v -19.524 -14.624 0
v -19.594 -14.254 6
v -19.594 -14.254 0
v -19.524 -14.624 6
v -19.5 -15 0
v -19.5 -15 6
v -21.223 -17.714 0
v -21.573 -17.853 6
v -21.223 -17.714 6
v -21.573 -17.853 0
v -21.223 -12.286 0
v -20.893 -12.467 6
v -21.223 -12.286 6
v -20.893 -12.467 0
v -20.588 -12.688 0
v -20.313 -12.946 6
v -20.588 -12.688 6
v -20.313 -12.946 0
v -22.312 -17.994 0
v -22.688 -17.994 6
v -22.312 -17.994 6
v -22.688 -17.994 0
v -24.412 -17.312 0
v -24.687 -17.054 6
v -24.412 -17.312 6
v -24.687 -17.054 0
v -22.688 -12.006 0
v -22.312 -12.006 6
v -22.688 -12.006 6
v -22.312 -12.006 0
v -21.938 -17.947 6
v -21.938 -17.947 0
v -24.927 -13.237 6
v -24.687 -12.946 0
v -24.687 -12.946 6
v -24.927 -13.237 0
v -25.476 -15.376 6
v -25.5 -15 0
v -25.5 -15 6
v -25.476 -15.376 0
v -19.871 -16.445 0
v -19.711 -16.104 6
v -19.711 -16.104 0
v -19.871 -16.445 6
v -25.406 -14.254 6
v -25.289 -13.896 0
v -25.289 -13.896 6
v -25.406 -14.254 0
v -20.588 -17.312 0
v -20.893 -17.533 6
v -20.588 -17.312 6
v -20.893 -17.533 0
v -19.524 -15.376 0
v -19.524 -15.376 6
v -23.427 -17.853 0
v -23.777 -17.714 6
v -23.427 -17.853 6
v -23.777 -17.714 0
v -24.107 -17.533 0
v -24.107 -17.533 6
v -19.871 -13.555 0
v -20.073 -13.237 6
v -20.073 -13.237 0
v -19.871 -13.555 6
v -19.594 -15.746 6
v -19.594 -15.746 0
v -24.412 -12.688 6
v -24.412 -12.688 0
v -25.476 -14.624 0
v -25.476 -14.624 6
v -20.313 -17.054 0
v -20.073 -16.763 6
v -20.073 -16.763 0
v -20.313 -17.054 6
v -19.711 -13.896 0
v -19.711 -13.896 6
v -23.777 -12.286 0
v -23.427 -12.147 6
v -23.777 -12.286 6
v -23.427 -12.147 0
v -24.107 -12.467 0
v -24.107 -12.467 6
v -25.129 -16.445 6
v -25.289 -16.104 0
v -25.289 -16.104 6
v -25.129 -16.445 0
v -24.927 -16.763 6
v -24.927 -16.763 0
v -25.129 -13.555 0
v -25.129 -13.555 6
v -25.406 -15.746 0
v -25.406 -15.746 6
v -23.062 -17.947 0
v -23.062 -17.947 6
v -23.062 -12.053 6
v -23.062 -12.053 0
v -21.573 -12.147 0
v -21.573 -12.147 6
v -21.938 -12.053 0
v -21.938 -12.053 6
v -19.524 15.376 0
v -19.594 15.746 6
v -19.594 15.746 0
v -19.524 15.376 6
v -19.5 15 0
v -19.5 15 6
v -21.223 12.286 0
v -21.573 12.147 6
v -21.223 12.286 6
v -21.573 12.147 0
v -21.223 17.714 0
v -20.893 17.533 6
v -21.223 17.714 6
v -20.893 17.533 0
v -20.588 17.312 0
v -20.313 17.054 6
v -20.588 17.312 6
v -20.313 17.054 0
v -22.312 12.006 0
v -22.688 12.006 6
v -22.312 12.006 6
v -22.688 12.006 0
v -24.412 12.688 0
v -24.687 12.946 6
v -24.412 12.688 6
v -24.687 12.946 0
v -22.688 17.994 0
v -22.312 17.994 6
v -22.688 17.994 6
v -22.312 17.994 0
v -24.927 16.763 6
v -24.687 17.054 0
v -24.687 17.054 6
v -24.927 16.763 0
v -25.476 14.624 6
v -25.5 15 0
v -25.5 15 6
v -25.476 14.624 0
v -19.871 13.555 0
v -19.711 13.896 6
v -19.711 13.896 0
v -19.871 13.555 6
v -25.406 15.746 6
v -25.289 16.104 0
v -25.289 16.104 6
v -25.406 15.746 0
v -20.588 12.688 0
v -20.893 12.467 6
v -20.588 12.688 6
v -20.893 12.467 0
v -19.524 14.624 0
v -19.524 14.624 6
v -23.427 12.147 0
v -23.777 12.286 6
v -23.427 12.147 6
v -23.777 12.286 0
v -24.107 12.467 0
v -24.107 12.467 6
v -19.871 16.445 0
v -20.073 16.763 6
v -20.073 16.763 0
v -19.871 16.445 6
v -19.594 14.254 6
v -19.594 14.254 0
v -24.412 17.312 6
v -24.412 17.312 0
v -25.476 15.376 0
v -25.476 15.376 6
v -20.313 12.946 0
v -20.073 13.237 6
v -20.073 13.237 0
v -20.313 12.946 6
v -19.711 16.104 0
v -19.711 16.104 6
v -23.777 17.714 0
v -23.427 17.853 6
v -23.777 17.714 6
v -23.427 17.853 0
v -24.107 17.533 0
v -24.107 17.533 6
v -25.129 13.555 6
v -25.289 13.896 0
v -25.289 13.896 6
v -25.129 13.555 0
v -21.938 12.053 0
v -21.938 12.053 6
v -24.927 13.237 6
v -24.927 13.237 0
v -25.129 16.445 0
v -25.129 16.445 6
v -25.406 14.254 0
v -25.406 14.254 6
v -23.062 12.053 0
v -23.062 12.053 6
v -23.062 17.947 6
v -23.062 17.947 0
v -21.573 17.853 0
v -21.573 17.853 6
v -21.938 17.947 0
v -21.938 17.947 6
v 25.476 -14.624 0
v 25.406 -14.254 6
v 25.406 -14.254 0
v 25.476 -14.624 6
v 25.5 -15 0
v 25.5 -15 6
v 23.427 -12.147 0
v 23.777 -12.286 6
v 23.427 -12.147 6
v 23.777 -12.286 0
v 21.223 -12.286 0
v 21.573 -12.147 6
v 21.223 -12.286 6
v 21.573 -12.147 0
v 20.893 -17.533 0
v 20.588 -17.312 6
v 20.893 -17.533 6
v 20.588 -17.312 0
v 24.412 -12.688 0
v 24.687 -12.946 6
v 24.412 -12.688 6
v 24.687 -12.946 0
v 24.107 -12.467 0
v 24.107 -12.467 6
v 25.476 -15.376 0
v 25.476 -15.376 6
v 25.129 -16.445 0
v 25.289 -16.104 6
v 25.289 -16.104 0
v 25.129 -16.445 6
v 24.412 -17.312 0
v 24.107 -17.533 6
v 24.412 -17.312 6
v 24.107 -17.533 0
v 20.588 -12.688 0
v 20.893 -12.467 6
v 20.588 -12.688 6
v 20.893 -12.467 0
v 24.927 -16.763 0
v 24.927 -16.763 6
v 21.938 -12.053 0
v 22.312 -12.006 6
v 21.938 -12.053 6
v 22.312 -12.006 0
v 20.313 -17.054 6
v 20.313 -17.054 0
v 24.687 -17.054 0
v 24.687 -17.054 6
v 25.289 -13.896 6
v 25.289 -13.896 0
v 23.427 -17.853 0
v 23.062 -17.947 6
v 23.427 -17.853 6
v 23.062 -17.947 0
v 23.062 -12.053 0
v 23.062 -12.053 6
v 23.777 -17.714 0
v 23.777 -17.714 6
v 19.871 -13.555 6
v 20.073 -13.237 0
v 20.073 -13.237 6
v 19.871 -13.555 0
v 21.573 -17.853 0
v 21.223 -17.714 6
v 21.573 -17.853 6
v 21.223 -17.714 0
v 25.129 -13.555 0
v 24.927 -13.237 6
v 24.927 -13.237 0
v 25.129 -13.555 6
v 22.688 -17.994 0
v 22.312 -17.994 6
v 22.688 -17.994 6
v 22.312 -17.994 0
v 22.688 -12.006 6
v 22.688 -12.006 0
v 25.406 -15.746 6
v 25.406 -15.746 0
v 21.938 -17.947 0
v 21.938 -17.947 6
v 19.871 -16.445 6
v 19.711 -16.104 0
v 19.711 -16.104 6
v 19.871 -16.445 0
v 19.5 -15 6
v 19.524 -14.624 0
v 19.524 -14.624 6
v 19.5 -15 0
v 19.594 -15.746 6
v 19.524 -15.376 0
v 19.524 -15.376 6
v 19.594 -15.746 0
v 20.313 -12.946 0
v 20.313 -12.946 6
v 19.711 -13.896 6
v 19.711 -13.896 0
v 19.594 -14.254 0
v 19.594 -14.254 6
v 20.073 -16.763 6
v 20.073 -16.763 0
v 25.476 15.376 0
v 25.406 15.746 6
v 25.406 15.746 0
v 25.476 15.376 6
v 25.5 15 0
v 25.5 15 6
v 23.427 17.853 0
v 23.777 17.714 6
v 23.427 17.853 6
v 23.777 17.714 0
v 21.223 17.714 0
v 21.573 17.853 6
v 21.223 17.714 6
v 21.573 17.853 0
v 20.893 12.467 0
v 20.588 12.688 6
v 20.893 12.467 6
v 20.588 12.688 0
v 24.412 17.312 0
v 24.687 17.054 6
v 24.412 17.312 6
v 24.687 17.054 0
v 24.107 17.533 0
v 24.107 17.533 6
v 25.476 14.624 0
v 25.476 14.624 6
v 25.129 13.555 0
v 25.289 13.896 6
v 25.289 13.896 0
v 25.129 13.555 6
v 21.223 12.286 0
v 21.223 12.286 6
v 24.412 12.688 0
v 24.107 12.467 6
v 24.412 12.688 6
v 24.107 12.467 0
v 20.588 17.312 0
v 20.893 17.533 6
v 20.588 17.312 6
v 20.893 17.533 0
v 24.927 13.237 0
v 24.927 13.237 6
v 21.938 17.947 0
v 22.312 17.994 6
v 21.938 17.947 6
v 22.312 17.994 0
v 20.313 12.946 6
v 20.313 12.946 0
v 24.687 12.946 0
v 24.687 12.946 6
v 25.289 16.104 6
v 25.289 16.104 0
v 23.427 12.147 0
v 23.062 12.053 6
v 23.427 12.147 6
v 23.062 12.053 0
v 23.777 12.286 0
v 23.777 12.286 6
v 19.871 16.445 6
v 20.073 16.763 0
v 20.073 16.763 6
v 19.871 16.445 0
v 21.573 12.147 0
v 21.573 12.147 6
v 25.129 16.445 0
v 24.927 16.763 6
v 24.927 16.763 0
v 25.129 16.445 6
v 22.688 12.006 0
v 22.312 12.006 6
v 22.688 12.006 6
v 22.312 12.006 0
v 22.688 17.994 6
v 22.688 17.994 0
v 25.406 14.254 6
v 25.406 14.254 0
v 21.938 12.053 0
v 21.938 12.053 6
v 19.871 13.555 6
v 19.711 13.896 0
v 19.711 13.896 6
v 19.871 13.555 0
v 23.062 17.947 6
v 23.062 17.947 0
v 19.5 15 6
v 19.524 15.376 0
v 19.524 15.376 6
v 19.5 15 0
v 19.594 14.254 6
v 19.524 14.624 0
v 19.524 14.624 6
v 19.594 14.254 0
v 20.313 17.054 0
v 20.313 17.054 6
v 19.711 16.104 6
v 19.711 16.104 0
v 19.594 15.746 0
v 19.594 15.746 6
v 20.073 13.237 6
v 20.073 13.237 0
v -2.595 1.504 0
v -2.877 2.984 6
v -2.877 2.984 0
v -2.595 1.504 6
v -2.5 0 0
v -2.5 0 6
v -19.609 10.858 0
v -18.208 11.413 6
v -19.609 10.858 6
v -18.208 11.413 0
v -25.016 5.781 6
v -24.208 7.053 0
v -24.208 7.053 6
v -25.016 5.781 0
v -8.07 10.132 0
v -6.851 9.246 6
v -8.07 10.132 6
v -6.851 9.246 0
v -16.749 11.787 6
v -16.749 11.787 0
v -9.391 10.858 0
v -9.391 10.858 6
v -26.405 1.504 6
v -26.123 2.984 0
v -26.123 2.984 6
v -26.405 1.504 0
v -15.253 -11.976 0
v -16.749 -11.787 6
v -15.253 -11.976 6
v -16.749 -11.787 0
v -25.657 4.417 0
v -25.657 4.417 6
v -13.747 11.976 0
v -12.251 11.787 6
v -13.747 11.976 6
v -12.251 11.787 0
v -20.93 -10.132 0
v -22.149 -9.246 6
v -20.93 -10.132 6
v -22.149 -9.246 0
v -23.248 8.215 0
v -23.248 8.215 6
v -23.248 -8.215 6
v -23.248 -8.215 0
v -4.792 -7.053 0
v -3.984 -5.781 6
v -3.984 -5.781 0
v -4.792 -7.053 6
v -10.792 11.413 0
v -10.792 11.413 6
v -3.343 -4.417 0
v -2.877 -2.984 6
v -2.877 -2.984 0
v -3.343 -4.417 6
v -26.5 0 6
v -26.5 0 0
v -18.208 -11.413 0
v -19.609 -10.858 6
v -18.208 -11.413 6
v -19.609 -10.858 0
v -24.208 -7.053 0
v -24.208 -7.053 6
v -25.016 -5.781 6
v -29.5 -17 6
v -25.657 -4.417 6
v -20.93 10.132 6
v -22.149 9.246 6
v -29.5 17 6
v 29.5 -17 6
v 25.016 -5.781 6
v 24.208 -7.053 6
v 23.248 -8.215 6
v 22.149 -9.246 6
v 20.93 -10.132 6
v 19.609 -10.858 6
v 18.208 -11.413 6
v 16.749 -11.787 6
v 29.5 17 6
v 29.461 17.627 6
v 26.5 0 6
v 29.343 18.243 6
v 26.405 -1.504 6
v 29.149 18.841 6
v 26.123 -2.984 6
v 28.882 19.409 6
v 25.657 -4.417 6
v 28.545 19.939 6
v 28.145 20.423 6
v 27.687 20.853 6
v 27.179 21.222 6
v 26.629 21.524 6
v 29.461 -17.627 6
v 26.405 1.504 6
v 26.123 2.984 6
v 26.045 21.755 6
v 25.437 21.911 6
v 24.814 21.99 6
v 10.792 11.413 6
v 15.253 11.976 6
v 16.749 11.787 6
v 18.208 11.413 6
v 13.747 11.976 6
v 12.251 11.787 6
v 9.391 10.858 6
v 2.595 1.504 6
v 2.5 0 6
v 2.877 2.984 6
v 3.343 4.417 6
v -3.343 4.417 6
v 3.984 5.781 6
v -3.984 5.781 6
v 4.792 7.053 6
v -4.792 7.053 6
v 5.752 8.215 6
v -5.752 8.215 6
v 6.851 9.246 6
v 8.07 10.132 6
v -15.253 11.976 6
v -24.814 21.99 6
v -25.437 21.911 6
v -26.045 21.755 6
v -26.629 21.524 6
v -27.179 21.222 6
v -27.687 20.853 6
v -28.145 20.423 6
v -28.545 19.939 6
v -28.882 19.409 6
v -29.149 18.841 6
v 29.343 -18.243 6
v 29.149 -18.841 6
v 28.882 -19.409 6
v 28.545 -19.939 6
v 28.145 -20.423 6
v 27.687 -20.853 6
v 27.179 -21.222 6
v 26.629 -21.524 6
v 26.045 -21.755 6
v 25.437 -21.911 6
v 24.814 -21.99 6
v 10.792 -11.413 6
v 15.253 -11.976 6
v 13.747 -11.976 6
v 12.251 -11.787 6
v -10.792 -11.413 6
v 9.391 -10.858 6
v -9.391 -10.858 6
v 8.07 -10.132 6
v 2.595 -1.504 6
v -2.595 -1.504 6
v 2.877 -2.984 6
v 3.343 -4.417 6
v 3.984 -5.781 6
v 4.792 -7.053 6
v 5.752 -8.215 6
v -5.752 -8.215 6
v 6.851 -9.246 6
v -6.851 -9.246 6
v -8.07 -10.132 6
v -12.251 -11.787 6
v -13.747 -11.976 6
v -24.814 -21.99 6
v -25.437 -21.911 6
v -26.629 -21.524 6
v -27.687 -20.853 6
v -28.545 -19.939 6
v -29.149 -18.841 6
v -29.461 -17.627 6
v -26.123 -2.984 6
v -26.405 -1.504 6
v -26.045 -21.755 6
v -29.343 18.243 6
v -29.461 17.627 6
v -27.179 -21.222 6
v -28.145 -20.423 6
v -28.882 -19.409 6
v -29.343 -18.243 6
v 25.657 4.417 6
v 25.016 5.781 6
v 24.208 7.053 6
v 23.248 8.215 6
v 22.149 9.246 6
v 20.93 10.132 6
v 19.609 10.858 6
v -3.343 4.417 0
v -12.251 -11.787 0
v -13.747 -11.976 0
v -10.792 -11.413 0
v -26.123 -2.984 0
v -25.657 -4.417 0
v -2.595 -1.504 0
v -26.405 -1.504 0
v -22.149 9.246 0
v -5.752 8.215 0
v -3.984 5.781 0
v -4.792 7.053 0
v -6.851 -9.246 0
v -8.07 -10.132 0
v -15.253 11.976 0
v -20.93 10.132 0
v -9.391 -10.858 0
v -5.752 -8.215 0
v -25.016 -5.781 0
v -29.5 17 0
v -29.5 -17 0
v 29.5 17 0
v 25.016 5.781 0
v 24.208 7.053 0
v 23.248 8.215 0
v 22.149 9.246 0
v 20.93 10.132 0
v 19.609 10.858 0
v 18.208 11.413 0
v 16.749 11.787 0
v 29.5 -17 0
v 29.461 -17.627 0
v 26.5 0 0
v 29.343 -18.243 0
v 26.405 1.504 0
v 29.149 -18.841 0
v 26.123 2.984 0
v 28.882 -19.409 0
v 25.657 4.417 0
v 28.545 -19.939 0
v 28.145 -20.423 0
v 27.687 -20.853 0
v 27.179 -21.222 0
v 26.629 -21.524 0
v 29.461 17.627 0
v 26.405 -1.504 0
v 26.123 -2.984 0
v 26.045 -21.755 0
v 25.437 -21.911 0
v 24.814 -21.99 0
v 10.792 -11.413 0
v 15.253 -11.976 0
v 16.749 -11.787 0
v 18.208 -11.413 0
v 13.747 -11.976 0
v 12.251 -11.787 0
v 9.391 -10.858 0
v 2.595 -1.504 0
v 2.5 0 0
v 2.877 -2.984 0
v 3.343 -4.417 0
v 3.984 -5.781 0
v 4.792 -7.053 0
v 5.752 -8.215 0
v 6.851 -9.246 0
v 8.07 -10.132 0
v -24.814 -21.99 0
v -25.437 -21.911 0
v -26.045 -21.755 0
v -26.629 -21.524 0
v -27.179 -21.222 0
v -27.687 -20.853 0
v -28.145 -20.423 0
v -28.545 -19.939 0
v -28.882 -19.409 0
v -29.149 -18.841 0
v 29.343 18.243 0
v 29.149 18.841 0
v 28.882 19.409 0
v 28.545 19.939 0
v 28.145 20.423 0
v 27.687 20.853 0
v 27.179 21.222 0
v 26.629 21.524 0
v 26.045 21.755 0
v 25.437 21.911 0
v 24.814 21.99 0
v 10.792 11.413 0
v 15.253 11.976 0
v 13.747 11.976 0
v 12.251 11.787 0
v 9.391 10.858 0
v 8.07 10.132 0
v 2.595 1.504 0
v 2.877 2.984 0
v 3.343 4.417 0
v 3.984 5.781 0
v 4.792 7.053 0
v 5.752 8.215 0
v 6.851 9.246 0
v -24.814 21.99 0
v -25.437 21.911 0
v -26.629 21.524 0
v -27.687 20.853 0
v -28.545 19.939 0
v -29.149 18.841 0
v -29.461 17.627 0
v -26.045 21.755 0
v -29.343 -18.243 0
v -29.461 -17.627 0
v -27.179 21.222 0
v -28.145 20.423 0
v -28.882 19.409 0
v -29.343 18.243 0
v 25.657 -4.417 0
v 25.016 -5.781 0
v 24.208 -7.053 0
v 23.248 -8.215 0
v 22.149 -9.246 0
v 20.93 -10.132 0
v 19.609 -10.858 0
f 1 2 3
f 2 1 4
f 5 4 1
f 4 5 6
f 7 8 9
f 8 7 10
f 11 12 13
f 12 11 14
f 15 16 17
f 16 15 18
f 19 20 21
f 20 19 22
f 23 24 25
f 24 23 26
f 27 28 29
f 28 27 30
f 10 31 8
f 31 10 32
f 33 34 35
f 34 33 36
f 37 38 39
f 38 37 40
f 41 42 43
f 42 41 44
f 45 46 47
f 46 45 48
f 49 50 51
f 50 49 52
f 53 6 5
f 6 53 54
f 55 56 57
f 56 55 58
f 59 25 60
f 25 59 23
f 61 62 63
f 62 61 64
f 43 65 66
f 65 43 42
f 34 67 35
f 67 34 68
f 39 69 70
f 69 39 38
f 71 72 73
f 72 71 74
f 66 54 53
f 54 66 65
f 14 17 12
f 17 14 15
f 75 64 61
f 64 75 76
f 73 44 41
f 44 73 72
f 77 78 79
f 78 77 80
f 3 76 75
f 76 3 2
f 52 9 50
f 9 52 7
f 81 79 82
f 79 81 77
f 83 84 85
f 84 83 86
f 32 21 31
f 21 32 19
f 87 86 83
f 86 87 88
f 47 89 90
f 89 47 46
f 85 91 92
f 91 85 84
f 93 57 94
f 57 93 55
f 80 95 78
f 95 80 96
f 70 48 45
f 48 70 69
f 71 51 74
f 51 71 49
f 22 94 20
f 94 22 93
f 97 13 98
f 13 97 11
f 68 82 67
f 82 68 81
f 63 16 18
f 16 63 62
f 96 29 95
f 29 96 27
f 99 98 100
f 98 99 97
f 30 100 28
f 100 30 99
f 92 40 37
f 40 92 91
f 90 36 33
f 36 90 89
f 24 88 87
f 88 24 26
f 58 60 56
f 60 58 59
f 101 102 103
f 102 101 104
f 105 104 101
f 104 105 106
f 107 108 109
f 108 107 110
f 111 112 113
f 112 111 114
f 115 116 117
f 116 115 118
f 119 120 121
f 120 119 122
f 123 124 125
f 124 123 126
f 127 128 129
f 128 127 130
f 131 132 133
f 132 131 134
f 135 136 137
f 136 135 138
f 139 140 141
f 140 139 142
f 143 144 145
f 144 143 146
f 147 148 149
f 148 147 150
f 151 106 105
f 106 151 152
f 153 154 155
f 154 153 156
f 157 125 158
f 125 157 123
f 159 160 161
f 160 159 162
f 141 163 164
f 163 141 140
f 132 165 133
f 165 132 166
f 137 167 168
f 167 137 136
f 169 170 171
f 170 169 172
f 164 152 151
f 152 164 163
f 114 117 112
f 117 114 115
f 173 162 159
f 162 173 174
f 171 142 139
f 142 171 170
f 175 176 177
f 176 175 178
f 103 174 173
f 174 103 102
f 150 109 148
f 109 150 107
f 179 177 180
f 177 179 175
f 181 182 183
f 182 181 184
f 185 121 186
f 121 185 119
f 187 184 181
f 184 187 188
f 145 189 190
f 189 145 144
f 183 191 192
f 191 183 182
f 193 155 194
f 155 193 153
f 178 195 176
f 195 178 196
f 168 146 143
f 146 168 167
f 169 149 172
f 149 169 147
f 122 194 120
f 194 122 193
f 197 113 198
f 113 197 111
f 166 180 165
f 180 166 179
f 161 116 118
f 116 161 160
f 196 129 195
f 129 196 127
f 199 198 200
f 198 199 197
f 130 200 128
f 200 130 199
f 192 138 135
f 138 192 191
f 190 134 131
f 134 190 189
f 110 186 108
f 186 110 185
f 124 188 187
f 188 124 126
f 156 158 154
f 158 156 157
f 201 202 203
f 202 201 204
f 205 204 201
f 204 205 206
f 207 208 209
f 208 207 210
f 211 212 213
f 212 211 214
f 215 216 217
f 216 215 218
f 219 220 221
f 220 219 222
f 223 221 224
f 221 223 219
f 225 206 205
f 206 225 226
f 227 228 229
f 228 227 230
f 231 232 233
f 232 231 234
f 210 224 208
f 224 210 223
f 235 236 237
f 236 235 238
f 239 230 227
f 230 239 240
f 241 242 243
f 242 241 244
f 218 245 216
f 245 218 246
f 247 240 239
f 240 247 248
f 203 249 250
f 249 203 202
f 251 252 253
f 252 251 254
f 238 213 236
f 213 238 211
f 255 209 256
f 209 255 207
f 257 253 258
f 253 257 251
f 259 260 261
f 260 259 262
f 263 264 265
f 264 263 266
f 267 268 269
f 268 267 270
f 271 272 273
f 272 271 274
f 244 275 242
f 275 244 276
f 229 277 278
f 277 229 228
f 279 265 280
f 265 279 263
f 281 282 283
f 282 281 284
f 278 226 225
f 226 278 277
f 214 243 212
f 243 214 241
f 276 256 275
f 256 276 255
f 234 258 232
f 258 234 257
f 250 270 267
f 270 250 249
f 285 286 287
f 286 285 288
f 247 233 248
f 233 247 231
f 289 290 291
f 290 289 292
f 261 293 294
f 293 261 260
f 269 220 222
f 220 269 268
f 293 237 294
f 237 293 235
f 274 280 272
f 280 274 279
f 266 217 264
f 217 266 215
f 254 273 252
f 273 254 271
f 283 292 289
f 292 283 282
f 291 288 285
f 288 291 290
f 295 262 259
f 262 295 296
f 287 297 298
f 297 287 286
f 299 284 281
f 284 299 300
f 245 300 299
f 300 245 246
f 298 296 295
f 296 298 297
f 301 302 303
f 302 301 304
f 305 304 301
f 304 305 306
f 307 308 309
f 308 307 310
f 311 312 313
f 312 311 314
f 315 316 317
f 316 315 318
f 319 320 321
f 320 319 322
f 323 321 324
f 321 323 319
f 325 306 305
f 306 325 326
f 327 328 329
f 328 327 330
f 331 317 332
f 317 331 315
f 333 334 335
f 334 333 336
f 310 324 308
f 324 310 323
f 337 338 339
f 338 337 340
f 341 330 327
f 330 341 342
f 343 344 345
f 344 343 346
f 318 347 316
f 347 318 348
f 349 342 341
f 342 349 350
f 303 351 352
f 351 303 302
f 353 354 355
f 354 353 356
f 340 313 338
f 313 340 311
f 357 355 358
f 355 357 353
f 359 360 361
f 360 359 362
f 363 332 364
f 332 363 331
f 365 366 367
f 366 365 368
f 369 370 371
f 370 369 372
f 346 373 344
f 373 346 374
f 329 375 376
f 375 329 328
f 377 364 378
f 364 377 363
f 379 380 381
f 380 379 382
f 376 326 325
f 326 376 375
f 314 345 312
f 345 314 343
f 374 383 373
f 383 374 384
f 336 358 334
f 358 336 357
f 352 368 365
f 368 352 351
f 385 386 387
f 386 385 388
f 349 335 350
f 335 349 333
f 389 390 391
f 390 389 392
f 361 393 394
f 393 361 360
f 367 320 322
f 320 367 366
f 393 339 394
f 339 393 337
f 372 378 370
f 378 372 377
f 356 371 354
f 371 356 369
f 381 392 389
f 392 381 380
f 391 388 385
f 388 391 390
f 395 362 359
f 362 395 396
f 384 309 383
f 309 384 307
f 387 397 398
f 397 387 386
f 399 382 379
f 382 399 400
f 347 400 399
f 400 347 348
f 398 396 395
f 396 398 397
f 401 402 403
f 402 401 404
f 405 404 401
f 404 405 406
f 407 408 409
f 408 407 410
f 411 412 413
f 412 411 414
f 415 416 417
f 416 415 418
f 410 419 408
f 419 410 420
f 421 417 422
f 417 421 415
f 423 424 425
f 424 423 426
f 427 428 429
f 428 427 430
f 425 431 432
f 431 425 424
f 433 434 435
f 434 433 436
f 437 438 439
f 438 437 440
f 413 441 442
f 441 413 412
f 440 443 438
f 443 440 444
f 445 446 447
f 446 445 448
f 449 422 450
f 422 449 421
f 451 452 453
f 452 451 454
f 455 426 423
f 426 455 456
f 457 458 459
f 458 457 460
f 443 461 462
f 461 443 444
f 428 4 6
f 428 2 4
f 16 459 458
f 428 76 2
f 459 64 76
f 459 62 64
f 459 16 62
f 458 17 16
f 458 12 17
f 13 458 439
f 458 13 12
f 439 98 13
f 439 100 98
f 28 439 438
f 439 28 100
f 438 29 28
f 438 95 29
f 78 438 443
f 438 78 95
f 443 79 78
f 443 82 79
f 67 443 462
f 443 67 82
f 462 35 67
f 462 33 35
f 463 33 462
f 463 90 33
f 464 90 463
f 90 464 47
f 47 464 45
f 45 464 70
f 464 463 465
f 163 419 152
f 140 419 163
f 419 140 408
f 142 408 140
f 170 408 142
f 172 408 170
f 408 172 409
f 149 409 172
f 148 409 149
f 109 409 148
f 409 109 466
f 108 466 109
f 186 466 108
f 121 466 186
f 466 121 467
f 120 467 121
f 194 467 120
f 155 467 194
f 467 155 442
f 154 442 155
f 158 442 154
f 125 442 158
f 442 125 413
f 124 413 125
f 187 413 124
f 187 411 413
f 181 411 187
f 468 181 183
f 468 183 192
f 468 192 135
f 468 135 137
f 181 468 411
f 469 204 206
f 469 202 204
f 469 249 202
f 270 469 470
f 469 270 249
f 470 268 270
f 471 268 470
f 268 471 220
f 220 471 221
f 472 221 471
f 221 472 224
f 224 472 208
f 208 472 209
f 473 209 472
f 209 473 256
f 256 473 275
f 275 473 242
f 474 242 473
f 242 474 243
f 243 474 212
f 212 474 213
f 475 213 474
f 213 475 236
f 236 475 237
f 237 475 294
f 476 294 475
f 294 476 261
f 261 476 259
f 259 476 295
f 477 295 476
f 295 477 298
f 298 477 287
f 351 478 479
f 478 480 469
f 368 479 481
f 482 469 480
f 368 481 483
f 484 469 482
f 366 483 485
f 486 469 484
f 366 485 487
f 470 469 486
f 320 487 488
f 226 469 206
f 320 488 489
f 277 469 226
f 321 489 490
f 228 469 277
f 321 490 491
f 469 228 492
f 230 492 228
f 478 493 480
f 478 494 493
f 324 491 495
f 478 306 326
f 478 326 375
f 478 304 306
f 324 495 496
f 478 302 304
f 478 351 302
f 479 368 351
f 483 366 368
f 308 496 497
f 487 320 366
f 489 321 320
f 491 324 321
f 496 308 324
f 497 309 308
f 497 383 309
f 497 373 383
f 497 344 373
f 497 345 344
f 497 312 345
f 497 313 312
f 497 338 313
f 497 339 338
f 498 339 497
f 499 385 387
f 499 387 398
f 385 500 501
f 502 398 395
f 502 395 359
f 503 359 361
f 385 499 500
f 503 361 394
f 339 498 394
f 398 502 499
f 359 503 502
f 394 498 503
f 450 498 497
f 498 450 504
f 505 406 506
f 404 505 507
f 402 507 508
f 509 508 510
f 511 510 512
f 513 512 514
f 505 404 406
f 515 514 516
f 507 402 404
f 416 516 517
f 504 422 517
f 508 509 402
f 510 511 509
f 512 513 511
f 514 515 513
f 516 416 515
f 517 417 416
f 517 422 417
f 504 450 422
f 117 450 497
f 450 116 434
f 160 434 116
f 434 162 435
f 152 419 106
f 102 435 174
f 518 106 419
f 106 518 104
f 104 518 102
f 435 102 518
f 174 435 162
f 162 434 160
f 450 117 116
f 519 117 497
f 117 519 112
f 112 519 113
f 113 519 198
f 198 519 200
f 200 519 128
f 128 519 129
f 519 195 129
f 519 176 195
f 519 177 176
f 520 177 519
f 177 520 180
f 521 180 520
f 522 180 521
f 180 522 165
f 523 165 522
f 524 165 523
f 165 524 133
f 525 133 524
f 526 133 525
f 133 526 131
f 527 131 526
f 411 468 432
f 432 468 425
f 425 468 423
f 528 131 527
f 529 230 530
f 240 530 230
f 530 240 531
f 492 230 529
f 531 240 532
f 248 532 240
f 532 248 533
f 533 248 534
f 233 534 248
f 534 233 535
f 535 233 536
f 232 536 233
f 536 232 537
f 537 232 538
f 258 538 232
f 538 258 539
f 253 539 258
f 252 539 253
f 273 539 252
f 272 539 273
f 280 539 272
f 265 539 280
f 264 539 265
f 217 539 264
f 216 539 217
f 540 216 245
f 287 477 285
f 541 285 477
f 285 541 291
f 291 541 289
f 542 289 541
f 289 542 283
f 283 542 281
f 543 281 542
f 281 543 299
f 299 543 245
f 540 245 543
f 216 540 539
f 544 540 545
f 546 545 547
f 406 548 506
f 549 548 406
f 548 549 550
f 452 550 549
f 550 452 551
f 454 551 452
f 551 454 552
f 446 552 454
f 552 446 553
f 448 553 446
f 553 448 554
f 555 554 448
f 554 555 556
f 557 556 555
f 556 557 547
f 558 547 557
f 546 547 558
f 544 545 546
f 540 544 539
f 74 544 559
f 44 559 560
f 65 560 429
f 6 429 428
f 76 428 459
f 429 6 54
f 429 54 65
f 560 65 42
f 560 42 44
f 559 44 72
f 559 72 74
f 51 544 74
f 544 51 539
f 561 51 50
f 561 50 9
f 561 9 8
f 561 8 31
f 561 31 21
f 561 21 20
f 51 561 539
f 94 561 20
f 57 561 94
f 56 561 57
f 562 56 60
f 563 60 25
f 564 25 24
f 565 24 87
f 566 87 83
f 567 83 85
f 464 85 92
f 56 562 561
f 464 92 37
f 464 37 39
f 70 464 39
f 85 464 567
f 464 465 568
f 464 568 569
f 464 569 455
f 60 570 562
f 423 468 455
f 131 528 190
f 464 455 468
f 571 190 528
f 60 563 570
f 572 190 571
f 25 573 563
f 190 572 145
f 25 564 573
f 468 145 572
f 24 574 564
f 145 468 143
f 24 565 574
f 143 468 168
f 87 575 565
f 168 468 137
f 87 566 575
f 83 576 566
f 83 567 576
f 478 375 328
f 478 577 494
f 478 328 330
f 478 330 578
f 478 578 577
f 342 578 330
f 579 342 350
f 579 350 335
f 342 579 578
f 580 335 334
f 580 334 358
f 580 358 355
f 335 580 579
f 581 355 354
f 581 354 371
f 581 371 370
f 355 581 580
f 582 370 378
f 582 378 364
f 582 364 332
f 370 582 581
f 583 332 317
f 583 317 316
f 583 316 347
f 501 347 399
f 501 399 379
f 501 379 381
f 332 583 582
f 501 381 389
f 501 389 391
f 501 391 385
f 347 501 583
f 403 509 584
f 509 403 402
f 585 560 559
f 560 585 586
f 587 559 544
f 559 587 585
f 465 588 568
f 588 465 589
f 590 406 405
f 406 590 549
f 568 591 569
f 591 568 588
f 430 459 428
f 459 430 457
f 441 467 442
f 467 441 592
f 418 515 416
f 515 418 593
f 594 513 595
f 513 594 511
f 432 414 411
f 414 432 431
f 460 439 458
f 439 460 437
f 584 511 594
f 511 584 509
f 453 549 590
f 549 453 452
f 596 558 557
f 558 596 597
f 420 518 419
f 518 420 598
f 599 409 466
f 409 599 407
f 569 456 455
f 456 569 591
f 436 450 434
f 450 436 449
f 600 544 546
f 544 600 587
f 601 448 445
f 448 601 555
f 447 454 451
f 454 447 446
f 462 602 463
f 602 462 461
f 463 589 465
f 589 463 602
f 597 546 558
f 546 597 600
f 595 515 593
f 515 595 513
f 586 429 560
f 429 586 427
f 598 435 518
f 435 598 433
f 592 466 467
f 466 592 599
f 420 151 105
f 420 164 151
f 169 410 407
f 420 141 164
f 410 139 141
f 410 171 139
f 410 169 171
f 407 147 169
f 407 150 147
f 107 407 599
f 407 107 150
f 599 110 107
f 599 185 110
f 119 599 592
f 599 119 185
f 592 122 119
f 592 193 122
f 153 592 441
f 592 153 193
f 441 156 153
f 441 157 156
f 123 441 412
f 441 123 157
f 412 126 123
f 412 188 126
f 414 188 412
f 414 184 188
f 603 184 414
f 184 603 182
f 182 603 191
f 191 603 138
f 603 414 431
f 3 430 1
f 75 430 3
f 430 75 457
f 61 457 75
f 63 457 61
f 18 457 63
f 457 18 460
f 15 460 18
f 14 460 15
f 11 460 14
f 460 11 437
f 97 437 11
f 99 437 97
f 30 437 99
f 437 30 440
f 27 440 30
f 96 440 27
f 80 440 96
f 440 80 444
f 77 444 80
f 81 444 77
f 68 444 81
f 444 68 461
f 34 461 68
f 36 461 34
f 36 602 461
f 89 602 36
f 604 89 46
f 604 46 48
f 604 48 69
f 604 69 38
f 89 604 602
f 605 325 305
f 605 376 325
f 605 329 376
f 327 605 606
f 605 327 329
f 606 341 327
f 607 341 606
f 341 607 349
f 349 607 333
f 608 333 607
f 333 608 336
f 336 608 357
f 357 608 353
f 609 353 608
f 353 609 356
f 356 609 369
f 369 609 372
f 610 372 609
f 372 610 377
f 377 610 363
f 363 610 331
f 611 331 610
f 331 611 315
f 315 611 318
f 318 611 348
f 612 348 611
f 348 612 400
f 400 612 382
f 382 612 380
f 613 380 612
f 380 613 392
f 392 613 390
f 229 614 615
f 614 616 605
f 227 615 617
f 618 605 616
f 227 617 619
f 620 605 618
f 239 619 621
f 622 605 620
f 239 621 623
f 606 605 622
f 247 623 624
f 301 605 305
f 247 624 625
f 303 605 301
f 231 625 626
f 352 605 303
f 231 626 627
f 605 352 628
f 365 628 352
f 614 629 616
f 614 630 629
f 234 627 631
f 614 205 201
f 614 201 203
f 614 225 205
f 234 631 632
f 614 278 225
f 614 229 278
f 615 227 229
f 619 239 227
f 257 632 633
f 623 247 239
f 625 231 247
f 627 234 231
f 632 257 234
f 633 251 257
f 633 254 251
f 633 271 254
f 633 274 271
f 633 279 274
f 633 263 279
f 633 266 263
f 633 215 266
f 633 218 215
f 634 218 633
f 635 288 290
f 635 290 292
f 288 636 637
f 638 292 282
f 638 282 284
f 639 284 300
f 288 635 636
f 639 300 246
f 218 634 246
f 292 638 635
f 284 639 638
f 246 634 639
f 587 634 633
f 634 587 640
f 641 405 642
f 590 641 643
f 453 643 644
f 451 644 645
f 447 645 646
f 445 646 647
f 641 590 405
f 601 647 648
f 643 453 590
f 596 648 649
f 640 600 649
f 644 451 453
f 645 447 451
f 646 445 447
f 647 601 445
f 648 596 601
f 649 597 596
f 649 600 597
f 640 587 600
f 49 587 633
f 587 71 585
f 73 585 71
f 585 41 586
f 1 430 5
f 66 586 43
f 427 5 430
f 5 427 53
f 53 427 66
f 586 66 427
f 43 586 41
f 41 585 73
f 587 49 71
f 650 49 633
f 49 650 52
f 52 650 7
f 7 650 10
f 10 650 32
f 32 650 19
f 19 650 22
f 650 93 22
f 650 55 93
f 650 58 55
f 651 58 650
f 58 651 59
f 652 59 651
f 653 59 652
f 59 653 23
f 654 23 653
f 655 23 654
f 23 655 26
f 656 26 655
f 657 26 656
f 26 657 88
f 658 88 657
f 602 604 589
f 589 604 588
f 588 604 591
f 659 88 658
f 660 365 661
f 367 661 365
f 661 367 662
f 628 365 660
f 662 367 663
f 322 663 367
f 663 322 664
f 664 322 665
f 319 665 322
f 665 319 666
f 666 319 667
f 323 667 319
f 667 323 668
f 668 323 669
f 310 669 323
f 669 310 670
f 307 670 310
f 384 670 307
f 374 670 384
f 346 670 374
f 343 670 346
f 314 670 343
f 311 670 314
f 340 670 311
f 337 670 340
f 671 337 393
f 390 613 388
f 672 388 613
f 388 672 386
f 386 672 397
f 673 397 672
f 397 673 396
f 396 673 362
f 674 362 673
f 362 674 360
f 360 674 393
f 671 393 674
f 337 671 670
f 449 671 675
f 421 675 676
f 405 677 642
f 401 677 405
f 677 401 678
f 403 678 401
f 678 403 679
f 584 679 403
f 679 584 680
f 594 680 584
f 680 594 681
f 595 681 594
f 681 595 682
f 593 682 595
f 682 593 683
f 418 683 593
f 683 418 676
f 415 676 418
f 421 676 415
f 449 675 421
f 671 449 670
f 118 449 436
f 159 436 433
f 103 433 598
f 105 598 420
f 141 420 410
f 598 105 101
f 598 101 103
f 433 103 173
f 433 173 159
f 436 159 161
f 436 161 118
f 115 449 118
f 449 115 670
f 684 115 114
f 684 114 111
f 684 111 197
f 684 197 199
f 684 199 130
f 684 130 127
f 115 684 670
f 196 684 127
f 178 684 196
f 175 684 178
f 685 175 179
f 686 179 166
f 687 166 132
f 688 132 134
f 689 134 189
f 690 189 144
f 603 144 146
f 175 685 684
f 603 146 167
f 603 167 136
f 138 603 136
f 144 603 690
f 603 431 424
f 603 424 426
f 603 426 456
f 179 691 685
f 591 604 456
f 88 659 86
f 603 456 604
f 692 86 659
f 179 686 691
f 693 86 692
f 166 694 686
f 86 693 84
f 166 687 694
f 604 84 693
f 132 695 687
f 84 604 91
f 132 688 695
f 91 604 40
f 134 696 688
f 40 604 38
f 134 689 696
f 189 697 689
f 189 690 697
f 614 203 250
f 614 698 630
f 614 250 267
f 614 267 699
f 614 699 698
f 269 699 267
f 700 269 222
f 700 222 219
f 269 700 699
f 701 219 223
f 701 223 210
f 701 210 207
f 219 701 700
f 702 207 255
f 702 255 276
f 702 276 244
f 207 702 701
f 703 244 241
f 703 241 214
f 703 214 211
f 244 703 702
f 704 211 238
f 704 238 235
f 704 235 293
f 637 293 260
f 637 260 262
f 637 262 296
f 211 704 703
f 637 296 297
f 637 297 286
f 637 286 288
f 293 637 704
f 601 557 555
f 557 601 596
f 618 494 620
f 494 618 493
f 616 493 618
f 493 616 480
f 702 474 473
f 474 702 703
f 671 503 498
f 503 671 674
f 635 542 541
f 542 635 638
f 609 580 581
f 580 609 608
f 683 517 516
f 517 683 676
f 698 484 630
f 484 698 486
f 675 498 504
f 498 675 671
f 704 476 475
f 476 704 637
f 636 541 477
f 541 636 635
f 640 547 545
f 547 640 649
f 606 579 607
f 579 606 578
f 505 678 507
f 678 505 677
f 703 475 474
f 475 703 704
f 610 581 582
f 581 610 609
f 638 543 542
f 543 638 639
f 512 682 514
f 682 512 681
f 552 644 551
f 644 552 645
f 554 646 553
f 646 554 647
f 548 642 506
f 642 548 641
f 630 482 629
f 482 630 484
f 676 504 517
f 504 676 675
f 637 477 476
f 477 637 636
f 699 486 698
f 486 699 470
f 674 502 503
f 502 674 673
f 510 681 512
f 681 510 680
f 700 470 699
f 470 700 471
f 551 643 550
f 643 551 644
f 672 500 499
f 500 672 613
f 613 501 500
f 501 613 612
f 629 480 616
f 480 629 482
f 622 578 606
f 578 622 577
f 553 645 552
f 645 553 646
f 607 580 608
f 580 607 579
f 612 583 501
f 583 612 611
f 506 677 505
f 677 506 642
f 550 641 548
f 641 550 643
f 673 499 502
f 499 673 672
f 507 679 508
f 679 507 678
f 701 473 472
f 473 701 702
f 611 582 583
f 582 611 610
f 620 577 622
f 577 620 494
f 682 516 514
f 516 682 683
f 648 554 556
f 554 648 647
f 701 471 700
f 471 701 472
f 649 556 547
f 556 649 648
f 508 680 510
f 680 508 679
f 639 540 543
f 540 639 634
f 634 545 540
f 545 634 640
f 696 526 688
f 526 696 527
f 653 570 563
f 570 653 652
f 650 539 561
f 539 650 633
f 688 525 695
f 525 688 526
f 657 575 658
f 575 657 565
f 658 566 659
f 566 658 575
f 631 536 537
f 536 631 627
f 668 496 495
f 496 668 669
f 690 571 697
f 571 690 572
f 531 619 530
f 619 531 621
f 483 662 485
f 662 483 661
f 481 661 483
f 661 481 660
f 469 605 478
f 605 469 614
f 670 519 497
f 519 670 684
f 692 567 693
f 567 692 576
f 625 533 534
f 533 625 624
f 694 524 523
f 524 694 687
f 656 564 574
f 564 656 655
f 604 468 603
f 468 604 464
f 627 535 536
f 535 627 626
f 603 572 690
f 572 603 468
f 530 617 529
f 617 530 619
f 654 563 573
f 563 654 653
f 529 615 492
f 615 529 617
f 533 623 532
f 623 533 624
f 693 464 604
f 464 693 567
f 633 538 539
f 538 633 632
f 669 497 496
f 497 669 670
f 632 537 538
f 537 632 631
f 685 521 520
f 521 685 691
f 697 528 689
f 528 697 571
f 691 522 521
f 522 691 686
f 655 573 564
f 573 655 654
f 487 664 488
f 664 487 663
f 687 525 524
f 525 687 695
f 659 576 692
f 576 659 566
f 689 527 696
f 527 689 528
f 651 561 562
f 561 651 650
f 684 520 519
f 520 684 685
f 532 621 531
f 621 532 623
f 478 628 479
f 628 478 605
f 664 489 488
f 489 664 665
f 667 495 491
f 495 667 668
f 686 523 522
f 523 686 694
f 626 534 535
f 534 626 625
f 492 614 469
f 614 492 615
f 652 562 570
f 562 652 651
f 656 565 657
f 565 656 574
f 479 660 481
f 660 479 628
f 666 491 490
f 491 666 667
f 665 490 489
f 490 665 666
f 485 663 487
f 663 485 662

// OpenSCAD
$fn = 50;


difference() {
	union() {
		hull() {
			translate(v = [-24.5000000000, 17.0000000000, 0]) {
				cylinder(h = 6, r = 5);
			}
			translate(v = [24.5000000000, 17.0000000000, 0]) {
				cylinder(h = 6, r = 5);
			}
			translate(v = [-24.5000000000, -17.0000000000, 0]) {
				cylinder(h = 6, r = 5);
			}
			translate(v = [24.5000000000, -17.0000000000, 0]) {
				cylinder(h = 6, r = 5);
			}
		}
	}
	union() {
		#translate(v = [-22.5000000000, -15.0000000000, -100.0000000000]) {
			cylinder(h = 200, r = 3.0000000000);
		}
		#translate(v = [-22.5000000000, 15.0000000000, -100.0000000000]) {
			cylinder(h = 200, r = 3.0000000000);
		}
		#translate(v = [22.5000000000, -15.0000000000, -100.0000000000]) {
			cylinder(h = 200, r = 3.0000000000);
		}
		#translate(v = [22.5000000000, 15.0000000000, -100.0000000000]) {
			cylinder(h = 200, r = 3.0000000000);
		}
		#translate(v = [-14.5000000000, 0, 0]) {
			cylinder(h = 6, r = 12.0000000000);
		}
		#translate(v = [14.5000000000, 0, 0]) {
			cylinder(h = 6, r = 12.0000000000);
		}
	}
}
